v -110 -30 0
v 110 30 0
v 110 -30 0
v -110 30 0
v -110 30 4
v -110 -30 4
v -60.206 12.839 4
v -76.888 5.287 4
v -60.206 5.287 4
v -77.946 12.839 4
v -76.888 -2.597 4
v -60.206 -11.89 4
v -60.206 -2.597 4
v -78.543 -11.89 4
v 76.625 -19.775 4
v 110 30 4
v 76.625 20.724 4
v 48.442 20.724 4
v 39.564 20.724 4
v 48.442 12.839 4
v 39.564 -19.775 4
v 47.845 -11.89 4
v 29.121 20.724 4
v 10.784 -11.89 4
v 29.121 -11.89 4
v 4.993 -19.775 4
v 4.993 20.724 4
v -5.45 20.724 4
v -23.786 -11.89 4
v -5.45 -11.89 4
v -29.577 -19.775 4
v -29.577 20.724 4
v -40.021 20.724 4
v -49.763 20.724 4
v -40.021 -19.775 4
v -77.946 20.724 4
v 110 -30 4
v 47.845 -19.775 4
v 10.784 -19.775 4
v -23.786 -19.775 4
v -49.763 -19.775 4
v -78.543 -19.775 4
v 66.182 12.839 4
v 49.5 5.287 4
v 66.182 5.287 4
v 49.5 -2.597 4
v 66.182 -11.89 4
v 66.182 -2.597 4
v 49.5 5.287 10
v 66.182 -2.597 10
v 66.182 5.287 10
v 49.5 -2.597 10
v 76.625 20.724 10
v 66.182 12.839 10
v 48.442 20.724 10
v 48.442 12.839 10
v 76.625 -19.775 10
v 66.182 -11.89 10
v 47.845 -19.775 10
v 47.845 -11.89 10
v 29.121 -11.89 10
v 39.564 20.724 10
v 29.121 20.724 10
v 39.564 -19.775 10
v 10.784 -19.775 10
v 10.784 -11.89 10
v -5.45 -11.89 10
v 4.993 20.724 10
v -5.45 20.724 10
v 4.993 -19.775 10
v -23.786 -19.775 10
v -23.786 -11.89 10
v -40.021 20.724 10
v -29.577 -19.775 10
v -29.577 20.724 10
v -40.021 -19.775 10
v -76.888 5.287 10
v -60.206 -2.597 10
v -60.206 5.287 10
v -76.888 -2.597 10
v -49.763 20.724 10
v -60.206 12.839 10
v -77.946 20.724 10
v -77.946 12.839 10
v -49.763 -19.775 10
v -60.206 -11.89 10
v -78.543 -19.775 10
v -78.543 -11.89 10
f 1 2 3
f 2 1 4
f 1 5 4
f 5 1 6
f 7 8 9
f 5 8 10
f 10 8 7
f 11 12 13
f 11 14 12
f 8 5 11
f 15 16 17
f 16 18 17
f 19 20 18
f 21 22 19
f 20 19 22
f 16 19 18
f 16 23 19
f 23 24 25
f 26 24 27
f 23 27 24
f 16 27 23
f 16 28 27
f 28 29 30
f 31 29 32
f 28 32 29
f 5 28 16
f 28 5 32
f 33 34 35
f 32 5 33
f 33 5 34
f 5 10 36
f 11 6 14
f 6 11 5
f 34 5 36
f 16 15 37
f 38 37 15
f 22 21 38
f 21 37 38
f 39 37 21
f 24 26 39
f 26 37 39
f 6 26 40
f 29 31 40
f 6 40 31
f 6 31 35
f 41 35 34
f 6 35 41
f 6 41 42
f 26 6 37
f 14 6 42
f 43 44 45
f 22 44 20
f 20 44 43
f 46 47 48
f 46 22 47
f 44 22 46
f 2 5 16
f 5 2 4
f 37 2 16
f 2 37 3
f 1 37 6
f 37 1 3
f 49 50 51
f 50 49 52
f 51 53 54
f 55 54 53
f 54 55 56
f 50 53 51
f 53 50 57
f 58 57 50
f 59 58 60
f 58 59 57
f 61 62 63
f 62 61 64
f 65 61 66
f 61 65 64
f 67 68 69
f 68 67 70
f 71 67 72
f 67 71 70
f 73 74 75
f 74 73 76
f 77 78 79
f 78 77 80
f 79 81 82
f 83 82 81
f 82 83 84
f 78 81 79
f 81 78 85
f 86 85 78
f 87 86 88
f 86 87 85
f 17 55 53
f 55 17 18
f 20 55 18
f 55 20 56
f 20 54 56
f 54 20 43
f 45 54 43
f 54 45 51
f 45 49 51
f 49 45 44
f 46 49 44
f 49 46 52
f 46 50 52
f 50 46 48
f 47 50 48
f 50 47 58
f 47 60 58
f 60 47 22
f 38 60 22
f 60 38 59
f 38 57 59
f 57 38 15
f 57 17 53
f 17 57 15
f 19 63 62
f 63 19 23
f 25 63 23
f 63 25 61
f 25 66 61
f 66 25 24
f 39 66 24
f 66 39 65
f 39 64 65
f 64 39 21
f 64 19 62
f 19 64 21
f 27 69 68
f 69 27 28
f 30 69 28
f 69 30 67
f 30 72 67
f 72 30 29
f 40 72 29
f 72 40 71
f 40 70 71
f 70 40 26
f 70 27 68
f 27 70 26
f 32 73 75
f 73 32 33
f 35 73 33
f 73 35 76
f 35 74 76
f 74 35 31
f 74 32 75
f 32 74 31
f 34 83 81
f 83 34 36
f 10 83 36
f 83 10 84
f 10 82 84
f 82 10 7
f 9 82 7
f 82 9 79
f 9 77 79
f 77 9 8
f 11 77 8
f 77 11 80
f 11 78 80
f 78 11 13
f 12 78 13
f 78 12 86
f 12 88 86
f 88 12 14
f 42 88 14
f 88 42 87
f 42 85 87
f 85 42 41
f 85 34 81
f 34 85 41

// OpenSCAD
/*
 * Cake stamp.
 * A Stamp on the cake. ELLIE, EVA, FEFE, BABA.
 * Uncomment at will. Works with TEXT.
 *
 * https://dev.to/erikaheidi/how-to-create-letter-molds-and-stamps-for-3d-printing-on-openscad-18am
 */
echo(version=version());

font = "DejaVu Sans:style=Bold";
letter_size = 40;
height = 10;

string = "ELLIE";
// string = "EVA";
// string = "FÉFÉ";
// string = "BABA";
textlen = len(string);

box_width = letter_size*textlen * 1.1;
box_height = letter_size * 1.5;

union() {
    linear_extrude(4) {
        square([box_width, box_height], center = true);
    }

    linear_extrude(height) {
      rotate([0, 180, 0]) {
        text(string, size = letter_size, font = font, halign = "center", valign = "center", $fn = 64);
      }
    }
}
